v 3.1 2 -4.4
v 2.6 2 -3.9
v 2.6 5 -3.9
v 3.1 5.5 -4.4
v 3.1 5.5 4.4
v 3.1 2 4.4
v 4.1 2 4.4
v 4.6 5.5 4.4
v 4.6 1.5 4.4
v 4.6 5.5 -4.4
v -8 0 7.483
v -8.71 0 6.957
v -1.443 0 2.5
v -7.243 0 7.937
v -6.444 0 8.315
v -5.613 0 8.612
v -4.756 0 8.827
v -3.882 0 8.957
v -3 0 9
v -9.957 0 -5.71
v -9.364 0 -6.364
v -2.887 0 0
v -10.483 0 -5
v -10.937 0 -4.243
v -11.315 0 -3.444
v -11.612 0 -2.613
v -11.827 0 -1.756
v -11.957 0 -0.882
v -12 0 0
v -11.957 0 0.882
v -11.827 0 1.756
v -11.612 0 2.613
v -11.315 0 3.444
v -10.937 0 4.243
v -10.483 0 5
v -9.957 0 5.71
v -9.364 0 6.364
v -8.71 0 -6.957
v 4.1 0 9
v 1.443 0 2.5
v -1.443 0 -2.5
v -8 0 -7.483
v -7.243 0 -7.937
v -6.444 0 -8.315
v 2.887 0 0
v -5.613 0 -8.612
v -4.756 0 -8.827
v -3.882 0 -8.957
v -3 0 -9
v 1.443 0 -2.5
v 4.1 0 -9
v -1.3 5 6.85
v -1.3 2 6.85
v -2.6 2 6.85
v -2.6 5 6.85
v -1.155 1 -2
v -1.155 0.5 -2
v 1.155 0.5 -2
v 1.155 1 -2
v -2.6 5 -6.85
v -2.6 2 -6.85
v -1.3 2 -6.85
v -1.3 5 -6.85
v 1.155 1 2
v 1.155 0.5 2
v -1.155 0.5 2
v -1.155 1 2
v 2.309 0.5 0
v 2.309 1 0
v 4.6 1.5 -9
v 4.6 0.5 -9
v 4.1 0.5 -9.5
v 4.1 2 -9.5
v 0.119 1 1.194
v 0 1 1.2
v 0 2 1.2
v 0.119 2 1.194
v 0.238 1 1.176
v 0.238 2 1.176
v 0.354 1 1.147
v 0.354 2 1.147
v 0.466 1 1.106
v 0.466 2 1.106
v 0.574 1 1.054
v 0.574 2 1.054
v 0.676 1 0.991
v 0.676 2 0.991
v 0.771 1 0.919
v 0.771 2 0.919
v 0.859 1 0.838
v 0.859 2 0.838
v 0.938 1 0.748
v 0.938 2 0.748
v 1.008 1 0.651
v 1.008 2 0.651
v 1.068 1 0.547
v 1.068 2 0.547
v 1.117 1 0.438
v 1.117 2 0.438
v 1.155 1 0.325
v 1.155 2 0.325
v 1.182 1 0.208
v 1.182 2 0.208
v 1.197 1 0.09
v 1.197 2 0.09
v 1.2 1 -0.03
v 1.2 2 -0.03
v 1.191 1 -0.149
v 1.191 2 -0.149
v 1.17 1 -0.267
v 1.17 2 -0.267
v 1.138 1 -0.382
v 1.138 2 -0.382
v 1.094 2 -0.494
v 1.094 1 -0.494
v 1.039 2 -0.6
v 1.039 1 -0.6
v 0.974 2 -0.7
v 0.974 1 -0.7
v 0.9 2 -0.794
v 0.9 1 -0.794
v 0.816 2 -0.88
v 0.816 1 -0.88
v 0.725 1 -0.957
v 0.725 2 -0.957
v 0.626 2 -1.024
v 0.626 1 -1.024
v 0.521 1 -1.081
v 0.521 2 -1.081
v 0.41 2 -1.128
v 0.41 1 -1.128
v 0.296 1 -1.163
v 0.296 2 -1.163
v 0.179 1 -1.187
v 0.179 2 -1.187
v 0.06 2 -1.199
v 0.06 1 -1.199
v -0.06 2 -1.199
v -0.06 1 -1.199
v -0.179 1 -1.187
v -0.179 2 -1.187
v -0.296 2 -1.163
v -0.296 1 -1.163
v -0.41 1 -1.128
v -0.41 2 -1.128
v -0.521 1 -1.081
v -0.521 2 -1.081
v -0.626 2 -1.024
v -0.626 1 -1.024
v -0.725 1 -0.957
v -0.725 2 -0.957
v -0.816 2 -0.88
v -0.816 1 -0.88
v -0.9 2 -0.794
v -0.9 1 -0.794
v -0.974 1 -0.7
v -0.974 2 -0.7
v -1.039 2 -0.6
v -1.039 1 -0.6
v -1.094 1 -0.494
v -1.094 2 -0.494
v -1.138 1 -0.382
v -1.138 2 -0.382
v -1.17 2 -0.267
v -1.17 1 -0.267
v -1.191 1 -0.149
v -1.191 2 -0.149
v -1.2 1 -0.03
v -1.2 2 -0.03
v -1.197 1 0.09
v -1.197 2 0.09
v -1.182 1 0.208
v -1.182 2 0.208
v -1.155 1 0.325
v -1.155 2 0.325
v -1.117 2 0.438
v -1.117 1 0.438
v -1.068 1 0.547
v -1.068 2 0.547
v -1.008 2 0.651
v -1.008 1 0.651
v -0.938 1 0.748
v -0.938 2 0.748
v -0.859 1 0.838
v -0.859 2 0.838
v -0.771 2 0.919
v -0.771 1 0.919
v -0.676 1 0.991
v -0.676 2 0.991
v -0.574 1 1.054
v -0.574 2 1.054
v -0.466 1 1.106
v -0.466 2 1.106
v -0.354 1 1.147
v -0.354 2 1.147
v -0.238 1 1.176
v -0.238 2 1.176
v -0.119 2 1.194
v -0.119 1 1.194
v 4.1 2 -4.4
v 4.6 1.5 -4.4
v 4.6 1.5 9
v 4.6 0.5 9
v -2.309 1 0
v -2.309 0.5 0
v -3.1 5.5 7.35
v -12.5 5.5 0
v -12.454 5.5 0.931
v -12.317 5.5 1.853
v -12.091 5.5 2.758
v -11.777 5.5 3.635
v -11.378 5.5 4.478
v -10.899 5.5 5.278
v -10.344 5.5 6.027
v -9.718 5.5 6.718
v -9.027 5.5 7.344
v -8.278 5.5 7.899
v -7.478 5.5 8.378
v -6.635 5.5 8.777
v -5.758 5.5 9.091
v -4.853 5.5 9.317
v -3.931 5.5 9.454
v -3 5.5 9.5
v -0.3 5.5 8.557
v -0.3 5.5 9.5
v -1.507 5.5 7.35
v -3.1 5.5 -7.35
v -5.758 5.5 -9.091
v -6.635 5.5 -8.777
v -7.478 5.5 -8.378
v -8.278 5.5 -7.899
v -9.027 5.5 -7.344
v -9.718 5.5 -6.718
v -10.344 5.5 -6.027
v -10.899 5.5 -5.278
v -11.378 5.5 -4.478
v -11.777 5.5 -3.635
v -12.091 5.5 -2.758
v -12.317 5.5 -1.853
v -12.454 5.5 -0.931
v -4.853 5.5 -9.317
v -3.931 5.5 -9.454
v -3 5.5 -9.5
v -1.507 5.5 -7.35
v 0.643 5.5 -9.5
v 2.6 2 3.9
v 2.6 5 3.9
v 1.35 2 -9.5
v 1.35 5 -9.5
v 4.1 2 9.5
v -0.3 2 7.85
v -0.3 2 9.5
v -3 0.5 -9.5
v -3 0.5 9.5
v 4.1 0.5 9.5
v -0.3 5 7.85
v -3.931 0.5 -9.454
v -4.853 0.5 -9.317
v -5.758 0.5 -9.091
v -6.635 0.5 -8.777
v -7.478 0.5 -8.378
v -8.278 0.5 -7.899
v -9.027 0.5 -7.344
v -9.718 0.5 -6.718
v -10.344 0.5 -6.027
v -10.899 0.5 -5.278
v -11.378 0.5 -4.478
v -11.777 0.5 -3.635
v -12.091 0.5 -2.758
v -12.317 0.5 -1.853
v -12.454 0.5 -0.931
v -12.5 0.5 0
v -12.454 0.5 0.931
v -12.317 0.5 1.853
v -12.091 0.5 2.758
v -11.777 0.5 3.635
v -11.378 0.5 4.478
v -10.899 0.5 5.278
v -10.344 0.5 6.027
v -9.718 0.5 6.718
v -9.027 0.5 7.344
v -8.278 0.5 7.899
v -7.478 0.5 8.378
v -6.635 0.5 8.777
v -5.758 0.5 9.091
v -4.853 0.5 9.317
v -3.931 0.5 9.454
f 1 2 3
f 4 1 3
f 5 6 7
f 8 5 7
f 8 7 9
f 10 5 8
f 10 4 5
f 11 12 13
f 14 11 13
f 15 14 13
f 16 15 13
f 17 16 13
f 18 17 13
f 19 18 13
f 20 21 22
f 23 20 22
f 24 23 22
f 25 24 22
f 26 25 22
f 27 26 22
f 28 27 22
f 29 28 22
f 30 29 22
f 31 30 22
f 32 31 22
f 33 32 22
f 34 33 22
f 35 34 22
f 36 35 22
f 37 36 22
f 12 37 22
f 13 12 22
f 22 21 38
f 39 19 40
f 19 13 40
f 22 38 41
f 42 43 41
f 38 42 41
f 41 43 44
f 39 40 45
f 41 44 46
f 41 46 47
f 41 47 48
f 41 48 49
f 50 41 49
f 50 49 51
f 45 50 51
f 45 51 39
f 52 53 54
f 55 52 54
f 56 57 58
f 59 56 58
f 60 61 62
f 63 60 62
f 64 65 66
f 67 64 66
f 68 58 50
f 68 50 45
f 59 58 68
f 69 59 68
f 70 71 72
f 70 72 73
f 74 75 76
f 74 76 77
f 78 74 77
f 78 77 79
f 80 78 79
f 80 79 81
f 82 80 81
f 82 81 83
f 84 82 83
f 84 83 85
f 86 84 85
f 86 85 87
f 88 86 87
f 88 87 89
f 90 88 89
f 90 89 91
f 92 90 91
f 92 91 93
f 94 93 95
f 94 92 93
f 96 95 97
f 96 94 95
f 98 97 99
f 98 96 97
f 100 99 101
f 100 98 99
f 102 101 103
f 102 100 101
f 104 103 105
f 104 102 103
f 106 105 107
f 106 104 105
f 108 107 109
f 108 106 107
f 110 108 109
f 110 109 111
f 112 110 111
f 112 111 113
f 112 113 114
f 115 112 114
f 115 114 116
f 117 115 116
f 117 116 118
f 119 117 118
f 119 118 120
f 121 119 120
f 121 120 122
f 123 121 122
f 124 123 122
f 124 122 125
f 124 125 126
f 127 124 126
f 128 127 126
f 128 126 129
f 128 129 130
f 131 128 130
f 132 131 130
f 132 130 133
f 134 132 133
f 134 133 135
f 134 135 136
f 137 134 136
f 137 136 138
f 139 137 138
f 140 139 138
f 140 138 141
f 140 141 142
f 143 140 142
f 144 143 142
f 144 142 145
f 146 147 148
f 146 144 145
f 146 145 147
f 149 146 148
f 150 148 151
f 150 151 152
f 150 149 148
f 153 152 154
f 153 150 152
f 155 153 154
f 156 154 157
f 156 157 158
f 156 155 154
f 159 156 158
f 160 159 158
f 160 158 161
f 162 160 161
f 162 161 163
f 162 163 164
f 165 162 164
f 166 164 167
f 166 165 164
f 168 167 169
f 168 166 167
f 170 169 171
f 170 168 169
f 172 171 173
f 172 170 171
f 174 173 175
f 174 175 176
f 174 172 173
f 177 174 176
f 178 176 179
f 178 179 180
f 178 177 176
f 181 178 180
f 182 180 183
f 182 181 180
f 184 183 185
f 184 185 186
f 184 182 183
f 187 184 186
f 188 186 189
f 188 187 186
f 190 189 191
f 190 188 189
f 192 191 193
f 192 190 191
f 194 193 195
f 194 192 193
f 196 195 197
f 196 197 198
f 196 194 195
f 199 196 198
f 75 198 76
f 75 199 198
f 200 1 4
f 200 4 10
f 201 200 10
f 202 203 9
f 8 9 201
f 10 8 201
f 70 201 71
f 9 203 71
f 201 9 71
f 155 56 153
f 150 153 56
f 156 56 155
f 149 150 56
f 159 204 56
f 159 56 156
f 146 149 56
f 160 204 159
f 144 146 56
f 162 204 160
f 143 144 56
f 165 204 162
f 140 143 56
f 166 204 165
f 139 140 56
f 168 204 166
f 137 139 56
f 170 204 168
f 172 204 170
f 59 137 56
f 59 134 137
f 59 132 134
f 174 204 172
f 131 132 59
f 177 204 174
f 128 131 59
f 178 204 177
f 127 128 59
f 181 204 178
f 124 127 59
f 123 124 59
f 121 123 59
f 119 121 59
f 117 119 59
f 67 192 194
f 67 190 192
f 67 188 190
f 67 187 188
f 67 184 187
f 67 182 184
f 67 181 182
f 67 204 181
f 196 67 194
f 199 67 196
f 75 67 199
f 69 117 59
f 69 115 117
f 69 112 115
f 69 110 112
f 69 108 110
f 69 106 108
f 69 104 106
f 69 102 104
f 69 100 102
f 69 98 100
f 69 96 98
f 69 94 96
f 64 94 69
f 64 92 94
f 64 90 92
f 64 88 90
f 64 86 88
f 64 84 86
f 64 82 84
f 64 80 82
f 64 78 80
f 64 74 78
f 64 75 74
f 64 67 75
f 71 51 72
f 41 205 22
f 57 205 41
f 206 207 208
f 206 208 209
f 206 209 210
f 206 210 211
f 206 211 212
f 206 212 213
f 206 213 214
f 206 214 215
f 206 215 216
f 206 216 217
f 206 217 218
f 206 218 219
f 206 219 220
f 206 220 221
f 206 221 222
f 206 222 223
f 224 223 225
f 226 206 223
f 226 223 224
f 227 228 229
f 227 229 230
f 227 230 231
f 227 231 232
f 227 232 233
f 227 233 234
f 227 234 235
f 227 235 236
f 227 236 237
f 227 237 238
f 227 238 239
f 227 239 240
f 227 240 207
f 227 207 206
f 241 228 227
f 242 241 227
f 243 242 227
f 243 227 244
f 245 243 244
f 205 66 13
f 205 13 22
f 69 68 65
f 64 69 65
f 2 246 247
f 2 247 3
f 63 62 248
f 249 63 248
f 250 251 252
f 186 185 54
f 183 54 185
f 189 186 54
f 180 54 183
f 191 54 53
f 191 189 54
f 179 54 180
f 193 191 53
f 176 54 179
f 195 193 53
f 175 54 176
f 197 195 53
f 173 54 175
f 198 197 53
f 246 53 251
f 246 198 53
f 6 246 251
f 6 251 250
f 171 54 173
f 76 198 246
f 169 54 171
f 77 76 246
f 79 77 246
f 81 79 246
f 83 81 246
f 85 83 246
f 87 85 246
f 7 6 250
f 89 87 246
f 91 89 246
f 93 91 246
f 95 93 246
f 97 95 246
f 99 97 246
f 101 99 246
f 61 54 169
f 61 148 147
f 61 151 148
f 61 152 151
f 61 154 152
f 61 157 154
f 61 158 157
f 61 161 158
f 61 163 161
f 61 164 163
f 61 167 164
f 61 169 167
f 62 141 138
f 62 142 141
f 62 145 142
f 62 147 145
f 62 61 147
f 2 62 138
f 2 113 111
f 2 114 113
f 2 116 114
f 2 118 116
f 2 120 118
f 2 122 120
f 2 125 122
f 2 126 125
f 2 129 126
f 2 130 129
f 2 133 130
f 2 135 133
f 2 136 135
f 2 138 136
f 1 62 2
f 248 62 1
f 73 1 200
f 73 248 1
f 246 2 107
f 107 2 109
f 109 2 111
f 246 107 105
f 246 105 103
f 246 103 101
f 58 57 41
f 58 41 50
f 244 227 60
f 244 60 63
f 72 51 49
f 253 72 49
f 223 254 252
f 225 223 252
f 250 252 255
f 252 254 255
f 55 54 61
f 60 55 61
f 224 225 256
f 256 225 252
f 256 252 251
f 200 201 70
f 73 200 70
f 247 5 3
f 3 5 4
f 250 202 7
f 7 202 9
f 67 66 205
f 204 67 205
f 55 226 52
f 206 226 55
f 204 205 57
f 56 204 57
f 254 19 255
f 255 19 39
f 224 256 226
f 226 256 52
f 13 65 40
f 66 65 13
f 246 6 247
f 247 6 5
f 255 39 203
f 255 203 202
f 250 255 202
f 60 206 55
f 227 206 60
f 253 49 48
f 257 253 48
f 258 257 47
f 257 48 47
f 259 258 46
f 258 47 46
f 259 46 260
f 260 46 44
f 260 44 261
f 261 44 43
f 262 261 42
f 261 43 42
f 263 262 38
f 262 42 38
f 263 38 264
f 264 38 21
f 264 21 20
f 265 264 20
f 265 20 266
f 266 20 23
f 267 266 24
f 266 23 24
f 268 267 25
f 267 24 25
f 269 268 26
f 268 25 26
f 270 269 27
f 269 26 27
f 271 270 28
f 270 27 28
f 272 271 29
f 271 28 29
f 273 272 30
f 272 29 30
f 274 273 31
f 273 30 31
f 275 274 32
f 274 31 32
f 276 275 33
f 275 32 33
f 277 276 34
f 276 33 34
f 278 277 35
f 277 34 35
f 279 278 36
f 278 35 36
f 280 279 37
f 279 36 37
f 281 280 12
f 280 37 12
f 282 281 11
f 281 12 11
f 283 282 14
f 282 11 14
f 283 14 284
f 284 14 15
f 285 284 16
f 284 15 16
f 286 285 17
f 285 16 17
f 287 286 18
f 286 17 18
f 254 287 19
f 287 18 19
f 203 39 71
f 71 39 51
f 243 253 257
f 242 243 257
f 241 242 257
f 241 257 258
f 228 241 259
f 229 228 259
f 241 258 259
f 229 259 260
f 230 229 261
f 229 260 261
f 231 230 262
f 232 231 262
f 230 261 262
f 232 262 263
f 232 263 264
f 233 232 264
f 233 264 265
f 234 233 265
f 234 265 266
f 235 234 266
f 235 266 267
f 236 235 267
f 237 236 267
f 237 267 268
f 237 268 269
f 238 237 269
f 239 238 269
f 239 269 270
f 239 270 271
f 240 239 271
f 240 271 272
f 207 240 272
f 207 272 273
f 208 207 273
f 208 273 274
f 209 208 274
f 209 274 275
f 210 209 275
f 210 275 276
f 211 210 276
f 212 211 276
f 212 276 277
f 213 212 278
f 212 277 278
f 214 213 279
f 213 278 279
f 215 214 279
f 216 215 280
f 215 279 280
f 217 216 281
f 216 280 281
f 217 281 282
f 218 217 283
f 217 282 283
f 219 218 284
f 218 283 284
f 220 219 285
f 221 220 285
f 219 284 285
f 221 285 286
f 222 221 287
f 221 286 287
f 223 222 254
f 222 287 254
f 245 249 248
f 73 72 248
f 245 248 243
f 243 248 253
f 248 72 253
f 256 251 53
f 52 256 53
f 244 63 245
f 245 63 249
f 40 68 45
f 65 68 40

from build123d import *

# Parameters (mm, degrees)
SKETCH1_R           = 1.2
BOSS_EXTRUDE1_DEPTH = 2
SKETCH2_W           = 2
SKETCH2_H           = 8.8
BOSS_EXTRUDE2_DEPTH = 3.5
CUT_EXTRUDE1_DEPTH  = 1
CHAMFER1_SIZE       = 0.5


with BuildPart() as part:
    # Sketch1 → Boss-Extrude1 (new body)
    with BuildSketch(Plane(origin=(0, 0, 0), x_dir=(1, 0, 0), z_dir=(0, 1, 0))):
        with BuildLine():
            Line((4.6, -9.5), (4.6, 9.5))
            Line((4.6, 9.5), (-3, 9.5))
            ThreePointArc((-3, 9.5), (-12.5, 0), (-3, -9.5))
            Line((-3, -9.5), (4.6, -9.5))
        make_face()
        with Locations(Location((0, 0, 0), (0, 0, 270))):
            Circle(SKETCH1_R, mode=Mode.SUBTRACT)
    extrude(amount=BOSS_EXTRUDE1_DEPTH)

    # Sketch2 → Boss-Extrude2 (add)
    with BuildSketch(Plane(origin=(0, 2, 0), x_dir=(1, 0, 0), z_dir=(0, 1, 0))):
        with Locations((3.6, 0)):
            Rectangle(SKETCH2_W, SKETCH2_H)
        with BuildLine():
            Line((-2.6, -6.85), (-2.6, 6.85))
            Line((-2.6, 6.85), (-1.3, 6.85))
            Line((-1.3, 6.85), (1.35, 9.5))
            Line((1.35, 9.5), (-3, 9.5))
            ThreePointArc((-3, 9.5), (-12.5, 0), (-3, -9.5))
            Line((-3, -9.5), (-0.3, -9.5))
            Line((-0.3, -9.5), (-0.3, -7.85))
            Line((-0.3, -7.85), (-1.3, -6.85))
            Line((-1.3, -6.85), (-2.6, -6.85))
        make_face()
    extrude(amount=BOSS_EXTRUDE2_DEPTH)

    # Sketch3 → Cut-Extrude1 (cut)
    with BuildSketch(Plane.XZ):
        Polygon((-2.309401077, 0), (-1.154700538, -2), (1.154700538, -2), (2.309401077, 0), (1.154700538, 2), (-1.154700538, 2), align=None)
    extrude(amount=-CUT_EXTRUDE1_DEPTH, mode=Mode.SUBTRACT)

    # Chamfer1
    chamfer1_edges = [part.edges().sort_by_distance(p)[0] for p in [
        (4.6, 2, 6.95),
        (-0.8, 5.5, 7.35),
        (-1.95, 5.5, 6.85),
        (-2.6, 5.5, 0),
        (-1.95, 5.5, -6.85),
        (0.025, 5.5, -8.175),
        (4.6, 2, -6.95),
        (2.6, 3.75, -4.4),
        (2.6, 3.75, 4.4),
        (2.6, 5.5, 0),
        (4.6, 0, 0),
        (0.8, 0, 9.5),
        (-12.5, 0, 0),
        (0.8, 0, -9.5),
        (-1.732050808, 0, 1),
        (-1.732050808, 0, -1),
        (0, 0, -2),
        (1.732050808, 0, -1),
        (1.732050808, 0, 1),
        (0, 0, 2),
        (4.6, 1, -9.5),
        (4.6, 1, 9.5),
    ]]
    chamfer(chamfer1_edges, length=CHAMFER1_SIZE)


solid = part.part
